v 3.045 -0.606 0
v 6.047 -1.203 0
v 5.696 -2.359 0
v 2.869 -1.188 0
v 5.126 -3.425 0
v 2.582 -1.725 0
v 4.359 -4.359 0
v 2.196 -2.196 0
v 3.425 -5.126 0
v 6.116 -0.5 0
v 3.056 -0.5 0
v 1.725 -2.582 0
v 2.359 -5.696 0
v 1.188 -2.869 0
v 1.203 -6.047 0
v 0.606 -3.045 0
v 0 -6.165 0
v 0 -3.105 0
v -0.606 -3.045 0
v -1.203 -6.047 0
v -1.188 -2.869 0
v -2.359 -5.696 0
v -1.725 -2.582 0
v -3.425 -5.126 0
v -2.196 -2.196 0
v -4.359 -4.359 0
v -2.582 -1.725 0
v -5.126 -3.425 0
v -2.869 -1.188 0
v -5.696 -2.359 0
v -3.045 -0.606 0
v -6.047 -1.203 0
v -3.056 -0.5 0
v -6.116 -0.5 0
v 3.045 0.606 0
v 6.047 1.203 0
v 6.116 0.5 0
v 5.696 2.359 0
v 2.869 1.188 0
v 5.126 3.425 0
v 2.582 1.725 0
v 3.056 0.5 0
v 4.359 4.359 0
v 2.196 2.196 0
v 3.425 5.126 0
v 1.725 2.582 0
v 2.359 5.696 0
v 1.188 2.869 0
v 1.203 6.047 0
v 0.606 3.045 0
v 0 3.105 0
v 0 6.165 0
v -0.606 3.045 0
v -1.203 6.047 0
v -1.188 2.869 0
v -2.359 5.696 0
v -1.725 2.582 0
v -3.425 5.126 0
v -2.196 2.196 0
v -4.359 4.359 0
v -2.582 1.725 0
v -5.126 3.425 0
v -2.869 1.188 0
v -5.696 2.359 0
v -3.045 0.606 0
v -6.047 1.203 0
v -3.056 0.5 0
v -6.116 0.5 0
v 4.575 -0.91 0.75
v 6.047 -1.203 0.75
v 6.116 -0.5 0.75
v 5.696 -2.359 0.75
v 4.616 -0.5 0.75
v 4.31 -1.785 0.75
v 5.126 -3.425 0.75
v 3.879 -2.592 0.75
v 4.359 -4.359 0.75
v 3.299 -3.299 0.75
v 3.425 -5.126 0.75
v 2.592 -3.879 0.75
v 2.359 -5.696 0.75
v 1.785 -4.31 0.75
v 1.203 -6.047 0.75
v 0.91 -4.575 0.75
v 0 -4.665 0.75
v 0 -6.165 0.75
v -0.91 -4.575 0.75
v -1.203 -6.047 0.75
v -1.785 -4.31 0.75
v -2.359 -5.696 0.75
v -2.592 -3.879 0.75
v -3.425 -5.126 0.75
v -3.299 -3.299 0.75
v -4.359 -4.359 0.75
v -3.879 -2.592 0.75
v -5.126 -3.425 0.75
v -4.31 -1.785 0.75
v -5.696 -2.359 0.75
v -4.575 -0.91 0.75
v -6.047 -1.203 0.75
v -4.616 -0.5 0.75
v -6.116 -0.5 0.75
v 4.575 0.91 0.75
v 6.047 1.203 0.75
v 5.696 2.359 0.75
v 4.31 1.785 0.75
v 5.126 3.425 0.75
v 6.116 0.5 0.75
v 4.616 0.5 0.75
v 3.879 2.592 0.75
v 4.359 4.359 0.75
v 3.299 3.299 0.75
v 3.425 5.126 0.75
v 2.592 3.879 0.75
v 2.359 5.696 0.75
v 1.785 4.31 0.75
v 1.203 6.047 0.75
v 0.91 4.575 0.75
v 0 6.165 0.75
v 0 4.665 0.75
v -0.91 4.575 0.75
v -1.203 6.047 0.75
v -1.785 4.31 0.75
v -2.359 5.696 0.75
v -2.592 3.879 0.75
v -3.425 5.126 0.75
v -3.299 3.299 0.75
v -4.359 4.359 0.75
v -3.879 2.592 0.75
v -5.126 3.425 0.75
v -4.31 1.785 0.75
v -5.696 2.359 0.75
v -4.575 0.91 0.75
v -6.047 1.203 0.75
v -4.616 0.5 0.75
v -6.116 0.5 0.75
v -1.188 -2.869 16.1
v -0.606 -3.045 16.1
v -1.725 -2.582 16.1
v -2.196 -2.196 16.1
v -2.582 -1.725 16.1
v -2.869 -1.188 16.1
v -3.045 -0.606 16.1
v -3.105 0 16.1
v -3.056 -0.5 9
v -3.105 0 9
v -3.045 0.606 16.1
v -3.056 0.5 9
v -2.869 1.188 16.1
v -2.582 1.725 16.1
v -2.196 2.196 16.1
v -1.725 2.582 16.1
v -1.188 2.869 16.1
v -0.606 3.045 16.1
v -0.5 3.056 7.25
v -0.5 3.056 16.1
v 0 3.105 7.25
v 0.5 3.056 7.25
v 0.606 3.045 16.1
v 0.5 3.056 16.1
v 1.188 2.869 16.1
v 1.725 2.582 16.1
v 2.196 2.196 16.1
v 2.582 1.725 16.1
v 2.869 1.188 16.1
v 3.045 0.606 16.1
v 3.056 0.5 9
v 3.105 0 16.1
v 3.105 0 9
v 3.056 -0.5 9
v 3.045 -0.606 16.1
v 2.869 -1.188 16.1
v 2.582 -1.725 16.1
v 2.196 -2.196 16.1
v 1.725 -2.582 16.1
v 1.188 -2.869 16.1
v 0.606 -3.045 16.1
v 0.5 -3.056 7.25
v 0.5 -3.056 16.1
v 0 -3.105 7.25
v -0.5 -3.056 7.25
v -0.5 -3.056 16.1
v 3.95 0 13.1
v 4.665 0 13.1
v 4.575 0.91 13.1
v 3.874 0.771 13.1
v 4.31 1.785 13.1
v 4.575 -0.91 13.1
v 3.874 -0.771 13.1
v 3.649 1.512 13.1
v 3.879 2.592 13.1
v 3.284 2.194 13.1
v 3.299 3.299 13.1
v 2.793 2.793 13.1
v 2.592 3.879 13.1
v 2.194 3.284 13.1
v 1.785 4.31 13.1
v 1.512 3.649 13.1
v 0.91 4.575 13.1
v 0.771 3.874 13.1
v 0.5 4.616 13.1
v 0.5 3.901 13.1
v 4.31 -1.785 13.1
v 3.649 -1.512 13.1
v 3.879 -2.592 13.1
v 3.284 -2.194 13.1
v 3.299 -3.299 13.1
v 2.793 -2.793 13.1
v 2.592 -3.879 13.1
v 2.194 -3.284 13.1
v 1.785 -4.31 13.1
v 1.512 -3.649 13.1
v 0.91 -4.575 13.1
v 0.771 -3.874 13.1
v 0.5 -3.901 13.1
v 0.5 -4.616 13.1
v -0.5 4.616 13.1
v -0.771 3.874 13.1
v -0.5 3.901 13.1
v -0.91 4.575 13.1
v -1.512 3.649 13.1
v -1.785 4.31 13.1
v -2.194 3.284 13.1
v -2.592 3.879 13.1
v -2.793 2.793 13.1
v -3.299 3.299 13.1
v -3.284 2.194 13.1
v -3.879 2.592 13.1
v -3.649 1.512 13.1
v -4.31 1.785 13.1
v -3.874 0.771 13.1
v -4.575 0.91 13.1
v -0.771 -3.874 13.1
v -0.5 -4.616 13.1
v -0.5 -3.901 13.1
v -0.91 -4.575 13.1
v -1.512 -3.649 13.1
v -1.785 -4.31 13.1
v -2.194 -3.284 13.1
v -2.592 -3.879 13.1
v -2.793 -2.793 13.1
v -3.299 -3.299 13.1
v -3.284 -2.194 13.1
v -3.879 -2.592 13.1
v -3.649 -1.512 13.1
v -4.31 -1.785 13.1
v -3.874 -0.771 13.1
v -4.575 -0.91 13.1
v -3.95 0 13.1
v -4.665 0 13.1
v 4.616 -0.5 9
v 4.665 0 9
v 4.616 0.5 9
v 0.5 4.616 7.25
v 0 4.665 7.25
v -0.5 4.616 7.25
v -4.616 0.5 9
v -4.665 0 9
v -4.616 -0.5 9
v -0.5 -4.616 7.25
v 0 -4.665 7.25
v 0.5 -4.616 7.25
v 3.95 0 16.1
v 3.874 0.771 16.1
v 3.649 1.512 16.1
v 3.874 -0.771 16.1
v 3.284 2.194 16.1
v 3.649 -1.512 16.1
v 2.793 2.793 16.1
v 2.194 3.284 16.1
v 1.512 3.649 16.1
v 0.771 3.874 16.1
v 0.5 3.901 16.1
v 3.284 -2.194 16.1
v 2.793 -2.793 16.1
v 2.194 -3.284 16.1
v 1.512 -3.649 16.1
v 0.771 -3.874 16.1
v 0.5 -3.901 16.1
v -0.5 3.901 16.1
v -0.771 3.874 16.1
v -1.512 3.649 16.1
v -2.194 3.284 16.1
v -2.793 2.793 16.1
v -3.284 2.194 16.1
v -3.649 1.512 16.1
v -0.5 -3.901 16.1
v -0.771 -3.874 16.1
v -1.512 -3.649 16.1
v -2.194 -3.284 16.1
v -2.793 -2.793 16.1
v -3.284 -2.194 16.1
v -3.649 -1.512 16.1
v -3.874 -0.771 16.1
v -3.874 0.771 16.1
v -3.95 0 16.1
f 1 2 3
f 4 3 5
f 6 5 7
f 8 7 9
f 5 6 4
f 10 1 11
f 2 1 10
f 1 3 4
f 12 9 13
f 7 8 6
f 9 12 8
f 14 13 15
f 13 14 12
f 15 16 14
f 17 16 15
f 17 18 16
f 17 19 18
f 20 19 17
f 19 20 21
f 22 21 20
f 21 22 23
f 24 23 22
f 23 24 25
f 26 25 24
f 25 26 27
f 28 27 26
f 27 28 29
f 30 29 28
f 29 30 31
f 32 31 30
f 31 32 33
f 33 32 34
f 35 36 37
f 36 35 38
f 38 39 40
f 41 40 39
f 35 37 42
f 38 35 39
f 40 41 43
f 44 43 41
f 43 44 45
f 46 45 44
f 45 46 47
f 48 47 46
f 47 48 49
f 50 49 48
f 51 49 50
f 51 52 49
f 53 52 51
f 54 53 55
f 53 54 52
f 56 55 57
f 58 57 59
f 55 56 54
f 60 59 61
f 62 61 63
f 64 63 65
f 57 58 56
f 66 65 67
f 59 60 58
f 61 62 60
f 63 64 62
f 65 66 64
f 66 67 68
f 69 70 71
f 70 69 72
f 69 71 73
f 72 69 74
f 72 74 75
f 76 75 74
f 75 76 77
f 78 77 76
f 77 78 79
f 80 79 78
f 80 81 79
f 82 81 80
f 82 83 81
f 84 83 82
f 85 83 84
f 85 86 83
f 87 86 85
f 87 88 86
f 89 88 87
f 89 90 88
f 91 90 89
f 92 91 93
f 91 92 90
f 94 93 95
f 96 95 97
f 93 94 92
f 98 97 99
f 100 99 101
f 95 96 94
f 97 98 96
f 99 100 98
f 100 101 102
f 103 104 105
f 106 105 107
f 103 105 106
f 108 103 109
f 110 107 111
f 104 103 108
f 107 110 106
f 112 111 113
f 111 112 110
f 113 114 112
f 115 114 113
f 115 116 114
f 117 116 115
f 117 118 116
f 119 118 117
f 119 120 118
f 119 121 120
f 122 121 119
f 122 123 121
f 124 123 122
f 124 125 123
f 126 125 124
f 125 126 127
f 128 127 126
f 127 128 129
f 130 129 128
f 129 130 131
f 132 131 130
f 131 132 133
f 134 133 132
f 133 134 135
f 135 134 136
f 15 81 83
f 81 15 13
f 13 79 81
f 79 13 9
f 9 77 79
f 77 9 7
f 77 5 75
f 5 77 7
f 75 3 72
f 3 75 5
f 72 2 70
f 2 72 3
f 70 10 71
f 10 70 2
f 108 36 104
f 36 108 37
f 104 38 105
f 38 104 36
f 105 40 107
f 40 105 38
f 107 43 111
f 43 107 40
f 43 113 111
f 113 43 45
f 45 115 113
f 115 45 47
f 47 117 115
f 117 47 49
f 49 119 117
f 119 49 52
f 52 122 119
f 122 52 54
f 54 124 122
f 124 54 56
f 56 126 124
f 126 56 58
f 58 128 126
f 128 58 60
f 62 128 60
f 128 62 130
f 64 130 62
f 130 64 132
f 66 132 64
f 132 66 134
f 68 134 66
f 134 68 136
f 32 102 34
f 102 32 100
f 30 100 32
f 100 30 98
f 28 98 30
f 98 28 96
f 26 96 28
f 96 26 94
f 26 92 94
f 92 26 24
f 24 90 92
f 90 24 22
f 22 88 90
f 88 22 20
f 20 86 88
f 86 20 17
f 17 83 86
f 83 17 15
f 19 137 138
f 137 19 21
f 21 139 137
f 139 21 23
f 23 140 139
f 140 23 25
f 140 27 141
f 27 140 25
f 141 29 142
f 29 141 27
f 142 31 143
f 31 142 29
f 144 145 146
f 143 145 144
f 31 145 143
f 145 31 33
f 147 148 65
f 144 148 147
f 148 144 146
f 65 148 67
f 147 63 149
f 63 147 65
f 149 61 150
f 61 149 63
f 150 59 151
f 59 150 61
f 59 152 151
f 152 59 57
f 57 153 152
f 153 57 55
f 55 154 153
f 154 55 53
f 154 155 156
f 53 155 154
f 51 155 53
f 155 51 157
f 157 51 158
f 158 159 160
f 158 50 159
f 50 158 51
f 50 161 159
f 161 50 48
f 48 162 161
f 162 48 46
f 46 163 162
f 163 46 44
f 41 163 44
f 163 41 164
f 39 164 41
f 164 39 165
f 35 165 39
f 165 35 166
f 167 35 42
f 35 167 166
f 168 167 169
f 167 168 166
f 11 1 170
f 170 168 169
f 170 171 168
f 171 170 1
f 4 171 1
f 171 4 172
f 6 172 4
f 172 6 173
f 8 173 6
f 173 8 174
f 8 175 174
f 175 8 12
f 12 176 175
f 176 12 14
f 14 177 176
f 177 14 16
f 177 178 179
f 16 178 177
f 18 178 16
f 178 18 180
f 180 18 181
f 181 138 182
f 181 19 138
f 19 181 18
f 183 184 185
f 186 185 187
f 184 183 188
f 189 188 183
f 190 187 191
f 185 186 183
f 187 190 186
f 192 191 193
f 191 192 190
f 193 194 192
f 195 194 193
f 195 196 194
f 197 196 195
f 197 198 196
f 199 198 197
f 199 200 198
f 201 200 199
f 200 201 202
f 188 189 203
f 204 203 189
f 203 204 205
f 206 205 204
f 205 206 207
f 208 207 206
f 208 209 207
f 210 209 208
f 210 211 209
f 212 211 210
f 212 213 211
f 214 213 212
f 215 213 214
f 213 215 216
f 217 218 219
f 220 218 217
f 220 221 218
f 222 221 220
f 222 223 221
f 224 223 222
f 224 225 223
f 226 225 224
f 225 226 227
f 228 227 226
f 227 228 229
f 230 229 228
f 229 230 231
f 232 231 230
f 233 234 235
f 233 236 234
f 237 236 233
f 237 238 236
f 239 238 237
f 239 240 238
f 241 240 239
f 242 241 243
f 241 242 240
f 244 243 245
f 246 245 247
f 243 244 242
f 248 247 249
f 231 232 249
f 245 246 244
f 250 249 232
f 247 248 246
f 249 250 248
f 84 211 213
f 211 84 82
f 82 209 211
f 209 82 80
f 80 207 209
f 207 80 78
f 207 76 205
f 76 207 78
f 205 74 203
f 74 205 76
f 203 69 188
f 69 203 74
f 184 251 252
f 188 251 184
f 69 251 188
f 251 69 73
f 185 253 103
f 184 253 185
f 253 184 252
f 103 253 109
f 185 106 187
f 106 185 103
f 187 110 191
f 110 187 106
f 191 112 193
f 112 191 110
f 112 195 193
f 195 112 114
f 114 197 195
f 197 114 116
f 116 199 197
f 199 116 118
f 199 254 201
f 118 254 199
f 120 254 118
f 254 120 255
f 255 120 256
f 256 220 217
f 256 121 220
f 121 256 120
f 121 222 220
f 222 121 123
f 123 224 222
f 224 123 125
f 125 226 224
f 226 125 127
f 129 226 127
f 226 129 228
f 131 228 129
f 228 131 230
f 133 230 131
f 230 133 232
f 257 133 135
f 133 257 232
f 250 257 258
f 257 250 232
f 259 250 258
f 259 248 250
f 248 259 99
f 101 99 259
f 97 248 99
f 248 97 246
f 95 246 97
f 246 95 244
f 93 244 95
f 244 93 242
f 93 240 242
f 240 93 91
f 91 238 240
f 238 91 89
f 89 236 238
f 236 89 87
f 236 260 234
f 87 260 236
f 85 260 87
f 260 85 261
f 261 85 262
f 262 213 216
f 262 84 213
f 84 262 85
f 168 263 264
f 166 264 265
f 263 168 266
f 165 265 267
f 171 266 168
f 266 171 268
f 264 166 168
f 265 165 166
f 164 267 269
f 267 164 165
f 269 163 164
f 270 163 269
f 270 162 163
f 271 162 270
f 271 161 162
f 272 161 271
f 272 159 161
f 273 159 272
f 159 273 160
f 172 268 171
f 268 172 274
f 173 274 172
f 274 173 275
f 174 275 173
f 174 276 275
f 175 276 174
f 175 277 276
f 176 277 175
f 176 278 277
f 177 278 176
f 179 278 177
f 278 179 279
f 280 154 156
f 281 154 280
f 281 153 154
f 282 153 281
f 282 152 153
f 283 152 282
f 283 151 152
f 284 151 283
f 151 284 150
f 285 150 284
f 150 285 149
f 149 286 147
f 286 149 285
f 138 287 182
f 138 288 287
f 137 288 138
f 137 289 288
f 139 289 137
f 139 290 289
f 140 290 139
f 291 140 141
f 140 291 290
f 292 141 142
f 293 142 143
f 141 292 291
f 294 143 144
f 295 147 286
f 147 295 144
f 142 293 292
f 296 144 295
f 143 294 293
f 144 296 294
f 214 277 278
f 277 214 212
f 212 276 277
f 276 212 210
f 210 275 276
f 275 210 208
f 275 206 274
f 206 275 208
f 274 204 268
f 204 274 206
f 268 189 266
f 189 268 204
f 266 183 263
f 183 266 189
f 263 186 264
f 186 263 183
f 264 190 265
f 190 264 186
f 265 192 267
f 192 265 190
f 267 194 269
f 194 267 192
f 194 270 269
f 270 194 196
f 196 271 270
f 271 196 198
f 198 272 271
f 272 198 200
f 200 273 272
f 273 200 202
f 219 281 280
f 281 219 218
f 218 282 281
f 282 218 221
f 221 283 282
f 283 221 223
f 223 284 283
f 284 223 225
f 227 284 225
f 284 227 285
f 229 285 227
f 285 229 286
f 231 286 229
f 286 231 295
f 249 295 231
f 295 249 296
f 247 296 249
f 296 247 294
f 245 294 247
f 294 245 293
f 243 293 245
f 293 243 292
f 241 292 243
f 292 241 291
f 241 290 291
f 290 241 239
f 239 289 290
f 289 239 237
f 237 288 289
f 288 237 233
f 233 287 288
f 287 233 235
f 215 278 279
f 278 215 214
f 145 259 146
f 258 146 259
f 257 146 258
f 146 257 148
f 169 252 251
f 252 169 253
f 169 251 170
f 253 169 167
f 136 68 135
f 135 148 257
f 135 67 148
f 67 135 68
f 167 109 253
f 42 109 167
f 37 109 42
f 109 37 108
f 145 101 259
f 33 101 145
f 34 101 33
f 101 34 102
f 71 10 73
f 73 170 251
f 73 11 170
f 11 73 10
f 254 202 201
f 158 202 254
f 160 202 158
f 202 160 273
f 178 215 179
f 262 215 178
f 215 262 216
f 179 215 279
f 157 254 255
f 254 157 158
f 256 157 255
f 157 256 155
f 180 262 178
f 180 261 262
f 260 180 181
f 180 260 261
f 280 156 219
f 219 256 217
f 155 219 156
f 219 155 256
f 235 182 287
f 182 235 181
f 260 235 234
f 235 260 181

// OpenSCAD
od = 9.43;
upperOD = 8;
upperExtra = 3;
id = 5.81;
height = 13.1;
bottomLipHeight = 0.75;
bottomLipStickout = 1.5;
tolOuter = .05;
tolInner = .2;
bottomSlitLength = 9;
slitOverlap = 1.75;
slitWidth = 1;

$fn = 32;
nudge = .001;

module annulus(id=5,od=10) {
    difference() {
        circle(d=od);
        circle(d=id);
    }
}

module main() {
    difference() {
        union() {
            linear_extrude(height=bottomLipHeight) annulus(id=id+2*tolInner,od=od-2*tolOuter+2*bottomLipStickout);
            linear_extrude(height=height) annulus(id=id+2*tolInner,od=od-2*tolOuter);
            linear_extrude(height=height+upperExtra) annulus(id=id+2*tolInner,od=upperOD-2*tolOuter);
        }
        cube([30,slitWidth,2*bottomSlitLength],center=true);
        translate([-slitWidth/2,-15,bottomSlitLength-slitOverlap]) cube([slitWidth,30,30]);
    }
}

main();
